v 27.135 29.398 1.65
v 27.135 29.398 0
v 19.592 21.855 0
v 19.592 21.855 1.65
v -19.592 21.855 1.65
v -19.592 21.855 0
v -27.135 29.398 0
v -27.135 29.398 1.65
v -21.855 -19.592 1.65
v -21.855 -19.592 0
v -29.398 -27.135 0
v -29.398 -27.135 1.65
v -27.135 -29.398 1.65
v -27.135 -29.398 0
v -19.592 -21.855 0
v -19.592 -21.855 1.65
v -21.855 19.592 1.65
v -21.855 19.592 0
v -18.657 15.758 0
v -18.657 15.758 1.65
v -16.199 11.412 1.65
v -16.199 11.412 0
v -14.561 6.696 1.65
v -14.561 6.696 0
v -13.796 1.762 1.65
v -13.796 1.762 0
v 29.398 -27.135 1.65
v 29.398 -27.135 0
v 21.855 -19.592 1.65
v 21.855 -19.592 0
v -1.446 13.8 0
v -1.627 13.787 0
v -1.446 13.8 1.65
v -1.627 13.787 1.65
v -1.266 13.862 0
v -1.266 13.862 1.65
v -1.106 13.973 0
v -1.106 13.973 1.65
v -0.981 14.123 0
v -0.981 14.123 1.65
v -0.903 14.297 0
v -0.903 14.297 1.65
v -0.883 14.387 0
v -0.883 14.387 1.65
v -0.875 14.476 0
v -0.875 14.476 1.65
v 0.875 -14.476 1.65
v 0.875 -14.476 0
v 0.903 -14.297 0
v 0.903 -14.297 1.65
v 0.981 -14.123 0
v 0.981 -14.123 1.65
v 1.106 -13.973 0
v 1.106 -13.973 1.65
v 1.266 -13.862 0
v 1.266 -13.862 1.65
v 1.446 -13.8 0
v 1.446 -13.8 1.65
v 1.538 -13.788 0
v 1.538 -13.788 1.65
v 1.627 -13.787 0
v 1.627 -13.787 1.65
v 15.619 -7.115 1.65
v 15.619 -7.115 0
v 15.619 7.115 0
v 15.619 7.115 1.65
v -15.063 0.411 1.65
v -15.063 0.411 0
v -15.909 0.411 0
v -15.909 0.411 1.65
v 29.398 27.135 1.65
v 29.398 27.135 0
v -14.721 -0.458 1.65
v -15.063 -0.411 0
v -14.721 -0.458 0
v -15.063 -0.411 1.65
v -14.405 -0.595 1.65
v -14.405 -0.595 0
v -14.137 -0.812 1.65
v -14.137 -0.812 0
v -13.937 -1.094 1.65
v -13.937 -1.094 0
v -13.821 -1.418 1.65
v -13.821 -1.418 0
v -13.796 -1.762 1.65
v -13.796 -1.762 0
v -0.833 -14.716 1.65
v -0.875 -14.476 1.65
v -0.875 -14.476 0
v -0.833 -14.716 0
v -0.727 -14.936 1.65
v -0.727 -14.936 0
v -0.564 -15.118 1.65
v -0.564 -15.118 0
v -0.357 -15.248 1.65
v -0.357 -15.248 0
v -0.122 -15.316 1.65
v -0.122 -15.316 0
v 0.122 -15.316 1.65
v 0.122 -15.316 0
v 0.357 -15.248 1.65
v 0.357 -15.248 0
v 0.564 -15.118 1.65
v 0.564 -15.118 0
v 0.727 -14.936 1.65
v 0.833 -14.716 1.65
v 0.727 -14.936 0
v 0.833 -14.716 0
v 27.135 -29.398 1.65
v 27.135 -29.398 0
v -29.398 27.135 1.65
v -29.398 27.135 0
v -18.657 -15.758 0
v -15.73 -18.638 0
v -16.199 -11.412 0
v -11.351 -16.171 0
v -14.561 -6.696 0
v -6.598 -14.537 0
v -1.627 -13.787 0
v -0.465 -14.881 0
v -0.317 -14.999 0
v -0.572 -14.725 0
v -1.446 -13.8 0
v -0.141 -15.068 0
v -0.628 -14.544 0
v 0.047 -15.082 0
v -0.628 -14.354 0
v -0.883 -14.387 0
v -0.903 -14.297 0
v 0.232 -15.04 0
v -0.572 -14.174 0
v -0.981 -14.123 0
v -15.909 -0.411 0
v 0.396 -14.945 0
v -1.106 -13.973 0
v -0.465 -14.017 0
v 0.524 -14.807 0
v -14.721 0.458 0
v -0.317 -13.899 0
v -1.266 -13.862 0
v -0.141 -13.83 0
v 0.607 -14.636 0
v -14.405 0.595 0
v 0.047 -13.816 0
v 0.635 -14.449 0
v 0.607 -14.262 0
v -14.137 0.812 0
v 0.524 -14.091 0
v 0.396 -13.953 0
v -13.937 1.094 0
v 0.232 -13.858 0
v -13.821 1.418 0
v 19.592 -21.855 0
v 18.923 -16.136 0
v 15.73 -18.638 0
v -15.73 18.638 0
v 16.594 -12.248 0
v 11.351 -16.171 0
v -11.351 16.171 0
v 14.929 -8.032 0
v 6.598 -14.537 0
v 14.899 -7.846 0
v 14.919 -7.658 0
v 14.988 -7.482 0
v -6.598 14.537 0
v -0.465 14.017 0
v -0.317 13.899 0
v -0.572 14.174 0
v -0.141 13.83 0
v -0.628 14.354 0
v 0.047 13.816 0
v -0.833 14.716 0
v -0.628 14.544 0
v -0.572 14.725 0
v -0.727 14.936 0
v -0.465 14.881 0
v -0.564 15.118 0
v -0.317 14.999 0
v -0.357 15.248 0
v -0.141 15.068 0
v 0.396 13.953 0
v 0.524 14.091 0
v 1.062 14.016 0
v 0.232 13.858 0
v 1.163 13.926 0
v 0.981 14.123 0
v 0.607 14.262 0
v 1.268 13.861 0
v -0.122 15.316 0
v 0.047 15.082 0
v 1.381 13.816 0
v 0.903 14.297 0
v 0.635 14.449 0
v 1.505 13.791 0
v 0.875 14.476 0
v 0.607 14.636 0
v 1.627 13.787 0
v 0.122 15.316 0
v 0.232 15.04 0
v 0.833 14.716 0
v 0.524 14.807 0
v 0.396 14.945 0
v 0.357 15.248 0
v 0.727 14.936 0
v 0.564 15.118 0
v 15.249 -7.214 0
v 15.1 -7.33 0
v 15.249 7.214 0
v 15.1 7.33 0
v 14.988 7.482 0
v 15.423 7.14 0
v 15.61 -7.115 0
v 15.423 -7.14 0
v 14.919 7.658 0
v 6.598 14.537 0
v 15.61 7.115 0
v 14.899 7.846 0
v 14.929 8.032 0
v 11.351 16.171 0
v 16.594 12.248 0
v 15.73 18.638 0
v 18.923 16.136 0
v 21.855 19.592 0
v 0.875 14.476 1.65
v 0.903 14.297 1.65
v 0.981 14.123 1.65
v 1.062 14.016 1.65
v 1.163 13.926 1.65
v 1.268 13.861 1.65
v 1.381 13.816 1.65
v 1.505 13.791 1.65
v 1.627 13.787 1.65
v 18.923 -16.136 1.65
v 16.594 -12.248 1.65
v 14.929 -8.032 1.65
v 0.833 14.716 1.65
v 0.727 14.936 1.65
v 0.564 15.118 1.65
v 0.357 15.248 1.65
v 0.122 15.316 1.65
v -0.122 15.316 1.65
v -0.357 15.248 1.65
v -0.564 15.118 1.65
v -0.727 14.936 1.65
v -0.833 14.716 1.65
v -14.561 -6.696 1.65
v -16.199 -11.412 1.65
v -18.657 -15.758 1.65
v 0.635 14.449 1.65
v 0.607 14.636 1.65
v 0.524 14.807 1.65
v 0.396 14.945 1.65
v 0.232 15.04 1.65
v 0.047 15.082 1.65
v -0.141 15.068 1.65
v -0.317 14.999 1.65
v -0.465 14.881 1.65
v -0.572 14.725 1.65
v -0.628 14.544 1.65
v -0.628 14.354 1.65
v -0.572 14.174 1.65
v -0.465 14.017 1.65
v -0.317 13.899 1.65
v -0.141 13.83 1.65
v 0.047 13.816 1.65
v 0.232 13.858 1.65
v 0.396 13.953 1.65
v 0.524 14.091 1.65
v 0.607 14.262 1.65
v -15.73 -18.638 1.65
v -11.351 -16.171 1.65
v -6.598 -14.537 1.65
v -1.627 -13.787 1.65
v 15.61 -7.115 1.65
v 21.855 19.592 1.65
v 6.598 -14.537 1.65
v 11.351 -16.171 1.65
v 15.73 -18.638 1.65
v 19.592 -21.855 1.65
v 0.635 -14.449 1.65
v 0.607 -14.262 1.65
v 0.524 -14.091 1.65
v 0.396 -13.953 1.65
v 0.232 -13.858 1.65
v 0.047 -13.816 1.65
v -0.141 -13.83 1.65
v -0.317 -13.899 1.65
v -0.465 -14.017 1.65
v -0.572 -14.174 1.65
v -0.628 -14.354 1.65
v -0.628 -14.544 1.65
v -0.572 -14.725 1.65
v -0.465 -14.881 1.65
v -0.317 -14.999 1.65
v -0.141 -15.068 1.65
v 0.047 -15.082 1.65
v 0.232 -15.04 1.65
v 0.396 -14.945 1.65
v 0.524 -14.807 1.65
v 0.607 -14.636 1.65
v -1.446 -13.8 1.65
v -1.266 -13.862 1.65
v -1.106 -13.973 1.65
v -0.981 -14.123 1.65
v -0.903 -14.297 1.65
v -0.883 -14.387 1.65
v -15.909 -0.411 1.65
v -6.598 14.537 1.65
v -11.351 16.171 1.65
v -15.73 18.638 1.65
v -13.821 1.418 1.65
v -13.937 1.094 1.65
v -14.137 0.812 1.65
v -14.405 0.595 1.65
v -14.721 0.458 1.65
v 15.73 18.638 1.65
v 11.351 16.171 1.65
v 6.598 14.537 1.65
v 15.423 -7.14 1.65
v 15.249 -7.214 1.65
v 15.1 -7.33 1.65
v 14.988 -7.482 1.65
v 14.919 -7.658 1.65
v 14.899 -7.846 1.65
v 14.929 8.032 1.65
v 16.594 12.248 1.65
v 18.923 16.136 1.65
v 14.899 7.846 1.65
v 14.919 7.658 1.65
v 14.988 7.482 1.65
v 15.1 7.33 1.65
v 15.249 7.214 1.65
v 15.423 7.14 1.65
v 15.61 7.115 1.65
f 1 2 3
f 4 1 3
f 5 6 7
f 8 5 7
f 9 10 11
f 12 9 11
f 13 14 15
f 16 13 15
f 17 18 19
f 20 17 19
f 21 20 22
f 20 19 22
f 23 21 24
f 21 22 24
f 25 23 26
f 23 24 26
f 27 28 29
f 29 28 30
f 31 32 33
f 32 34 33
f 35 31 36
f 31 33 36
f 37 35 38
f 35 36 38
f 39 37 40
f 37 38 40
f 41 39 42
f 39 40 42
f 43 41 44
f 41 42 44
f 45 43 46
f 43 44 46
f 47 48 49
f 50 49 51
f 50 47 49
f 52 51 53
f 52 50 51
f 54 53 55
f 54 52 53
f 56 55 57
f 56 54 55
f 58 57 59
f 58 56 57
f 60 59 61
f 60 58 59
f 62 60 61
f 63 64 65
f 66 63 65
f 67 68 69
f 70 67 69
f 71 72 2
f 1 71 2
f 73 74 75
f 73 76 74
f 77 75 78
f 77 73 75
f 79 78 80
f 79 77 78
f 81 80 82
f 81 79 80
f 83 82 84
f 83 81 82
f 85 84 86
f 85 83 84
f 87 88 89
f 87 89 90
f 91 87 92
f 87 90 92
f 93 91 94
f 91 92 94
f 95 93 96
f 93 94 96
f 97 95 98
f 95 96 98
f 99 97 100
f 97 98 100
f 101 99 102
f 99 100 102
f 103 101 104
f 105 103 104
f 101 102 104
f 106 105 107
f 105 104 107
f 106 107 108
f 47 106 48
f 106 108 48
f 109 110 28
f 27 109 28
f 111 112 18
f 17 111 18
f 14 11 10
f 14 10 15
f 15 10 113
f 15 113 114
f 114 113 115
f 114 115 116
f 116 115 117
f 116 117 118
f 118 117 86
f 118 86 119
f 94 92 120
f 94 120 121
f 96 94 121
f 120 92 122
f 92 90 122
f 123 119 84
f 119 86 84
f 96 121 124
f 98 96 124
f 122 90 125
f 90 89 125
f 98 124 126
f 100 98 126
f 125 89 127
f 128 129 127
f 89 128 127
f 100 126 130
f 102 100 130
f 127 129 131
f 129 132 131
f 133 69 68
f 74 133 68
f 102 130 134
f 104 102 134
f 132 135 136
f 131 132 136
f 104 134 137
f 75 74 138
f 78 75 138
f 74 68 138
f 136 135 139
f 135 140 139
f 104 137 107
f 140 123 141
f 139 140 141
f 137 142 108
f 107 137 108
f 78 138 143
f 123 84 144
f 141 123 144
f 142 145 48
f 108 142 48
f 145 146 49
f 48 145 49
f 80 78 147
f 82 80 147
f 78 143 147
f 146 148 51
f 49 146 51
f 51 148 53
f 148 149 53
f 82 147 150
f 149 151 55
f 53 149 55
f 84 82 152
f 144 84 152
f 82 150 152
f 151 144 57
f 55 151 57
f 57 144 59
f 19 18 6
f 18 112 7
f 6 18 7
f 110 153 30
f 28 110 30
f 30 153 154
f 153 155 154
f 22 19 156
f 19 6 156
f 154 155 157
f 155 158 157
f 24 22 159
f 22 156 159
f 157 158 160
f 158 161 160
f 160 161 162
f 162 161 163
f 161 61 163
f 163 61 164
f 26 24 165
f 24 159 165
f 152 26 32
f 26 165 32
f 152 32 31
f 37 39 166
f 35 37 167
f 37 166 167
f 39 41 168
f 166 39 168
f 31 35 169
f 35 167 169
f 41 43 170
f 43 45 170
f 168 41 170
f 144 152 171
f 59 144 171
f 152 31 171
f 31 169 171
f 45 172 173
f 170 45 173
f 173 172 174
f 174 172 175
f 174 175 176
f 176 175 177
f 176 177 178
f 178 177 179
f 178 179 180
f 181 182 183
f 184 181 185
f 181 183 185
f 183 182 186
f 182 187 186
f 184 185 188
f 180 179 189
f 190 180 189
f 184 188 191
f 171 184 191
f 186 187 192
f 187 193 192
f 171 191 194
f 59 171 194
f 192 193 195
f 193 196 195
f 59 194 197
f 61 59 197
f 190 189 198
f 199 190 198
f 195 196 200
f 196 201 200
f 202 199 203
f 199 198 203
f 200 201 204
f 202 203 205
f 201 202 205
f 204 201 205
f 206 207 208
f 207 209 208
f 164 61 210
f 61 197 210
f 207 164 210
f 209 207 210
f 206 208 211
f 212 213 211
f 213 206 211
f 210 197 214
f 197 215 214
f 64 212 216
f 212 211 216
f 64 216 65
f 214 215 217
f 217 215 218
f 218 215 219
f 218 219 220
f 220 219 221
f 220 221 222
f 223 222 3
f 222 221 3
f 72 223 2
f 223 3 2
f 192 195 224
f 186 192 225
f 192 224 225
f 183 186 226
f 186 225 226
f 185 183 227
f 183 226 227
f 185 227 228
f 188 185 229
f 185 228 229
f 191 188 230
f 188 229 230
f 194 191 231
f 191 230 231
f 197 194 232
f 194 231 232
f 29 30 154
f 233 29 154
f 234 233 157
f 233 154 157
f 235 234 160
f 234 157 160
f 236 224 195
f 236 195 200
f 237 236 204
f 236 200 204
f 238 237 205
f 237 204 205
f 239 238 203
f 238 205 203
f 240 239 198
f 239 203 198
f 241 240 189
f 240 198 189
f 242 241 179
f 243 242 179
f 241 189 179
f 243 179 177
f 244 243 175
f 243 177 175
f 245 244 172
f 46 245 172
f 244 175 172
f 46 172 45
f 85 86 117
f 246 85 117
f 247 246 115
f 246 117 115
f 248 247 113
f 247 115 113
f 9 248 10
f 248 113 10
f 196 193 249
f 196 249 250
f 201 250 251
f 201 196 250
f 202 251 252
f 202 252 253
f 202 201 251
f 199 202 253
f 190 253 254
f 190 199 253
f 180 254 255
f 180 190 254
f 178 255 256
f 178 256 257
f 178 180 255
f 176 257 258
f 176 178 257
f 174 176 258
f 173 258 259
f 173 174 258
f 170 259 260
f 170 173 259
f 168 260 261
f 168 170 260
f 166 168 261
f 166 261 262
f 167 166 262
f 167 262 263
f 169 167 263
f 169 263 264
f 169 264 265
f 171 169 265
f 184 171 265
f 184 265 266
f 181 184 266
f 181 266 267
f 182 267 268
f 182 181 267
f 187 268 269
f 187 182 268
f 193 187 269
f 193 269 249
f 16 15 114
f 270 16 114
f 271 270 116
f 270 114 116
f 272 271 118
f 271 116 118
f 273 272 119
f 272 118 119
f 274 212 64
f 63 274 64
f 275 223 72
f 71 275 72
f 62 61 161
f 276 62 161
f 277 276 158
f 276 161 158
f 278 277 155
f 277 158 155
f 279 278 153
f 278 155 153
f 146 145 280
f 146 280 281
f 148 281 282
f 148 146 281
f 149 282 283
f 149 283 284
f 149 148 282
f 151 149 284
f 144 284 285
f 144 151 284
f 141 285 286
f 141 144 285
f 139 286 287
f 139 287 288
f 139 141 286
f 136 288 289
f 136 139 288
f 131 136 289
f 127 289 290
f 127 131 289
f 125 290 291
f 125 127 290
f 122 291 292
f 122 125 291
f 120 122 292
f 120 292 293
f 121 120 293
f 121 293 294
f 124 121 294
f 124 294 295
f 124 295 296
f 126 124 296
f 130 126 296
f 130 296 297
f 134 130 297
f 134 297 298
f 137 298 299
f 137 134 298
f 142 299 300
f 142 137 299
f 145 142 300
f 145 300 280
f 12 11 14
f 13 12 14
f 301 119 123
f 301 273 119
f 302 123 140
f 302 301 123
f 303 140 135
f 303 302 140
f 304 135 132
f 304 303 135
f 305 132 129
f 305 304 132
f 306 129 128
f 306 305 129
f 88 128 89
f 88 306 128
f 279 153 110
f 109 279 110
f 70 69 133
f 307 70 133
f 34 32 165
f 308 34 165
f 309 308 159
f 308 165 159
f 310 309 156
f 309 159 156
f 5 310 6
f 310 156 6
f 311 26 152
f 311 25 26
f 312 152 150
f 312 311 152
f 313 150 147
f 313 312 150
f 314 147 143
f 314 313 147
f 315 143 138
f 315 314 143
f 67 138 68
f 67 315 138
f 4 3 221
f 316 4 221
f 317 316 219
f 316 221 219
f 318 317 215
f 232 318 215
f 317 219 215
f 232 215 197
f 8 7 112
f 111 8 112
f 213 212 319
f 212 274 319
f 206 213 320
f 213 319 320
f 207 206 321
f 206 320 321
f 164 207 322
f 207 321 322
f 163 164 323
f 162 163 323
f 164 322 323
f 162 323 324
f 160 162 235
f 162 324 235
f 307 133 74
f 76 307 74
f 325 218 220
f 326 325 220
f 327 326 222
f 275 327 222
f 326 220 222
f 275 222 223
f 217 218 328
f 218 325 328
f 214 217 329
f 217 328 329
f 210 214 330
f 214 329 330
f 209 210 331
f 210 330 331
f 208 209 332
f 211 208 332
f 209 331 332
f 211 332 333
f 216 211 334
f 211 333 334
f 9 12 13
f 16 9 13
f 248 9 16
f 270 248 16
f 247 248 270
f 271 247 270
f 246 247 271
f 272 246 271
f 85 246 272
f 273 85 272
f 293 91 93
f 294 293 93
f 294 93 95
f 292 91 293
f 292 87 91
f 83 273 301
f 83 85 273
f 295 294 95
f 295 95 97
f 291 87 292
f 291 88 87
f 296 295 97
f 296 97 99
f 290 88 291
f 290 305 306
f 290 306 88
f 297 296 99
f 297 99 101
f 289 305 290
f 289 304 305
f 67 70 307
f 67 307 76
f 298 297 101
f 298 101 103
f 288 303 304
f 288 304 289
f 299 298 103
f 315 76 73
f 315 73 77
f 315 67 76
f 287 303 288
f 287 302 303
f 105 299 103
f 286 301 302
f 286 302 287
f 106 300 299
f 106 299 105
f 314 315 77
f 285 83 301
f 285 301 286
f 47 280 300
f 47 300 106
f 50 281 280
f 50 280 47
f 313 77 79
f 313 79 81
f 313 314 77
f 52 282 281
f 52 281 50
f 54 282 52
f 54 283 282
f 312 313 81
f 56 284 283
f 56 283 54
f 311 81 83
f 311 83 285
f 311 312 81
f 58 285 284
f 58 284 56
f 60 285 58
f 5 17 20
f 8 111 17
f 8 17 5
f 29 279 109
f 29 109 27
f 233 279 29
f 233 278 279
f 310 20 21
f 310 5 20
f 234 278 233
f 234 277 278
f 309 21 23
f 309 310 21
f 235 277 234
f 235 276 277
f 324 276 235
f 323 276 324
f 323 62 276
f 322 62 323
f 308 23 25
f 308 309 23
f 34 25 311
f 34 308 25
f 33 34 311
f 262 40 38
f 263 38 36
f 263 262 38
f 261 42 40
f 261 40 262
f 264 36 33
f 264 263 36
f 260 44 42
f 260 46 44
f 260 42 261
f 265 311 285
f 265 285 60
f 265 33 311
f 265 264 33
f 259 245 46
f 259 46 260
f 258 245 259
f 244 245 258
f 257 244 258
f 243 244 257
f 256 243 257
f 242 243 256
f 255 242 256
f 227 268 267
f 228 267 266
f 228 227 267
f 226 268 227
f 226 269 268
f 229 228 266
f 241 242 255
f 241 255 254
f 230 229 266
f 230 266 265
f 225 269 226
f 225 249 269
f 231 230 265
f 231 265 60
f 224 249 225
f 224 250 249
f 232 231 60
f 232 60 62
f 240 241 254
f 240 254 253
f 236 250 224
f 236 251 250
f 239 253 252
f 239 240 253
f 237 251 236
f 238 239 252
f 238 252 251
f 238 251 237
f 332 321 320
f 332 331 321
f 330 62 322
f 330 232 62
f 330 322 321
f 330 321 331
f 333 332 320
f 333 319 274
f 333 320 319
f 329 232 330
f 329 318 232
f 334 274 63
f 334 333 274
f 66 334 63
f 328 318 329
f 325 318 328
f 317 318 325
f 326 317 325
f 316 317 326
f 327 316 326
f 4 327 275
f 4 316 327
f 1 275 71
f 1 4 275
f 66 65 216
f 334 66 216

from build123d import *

# Parameters (mm, degrees)
SKETCH1_R           = 0.634780864
BOSS_EXTRUDE1_DEPTH = 1.65
FILLET1_R           = 0.7112
FILLET2_R           = 0.7112
FILLET3_R           = 1.27


with BuildPart() as part:
    # Sketch1 → Boss-Extrude1 (new body)
    with BuildSketch(Plane.XY):
        with BuildLine():
            Line((-27.135222714, 29.397964527), (-29.397964527, 27.135222714))
            Line((-29.397964527, 27.135222714), (-21.855060774, 19.592318961))
            ThreePointArc((-21.855060774, 19.592318961), (-15.928204538, 10.7930358), (-13.742710724, 0.41138729))
            Line((-13.742710724, 0.41138729), (-15.908512943, 0.41138729))
            Line((-15.908512943, 0.41138729), (-15.908512943, -0.41138729))
            Line((-15.908512943, -0.41138729), (-13.742710724, -0.41138729))
            ThreePointArc((-13.742710724, -0.41138729), (-15.928204538, -10.7930358), (-21.855060774, -19.592318961))
            Line((-21.855060774, -19.592318961), (-29.397964527, -27.135222714))
            Line((-29.397964527, -27.135222714), (-27.135222714, -29.397964527))
            Line((-27.135222714, -29.397964527), (-19.592318961, -21.855060774))
            ThreePointArc((-19.592318961, -21.855060774), (-10.842511416, -15.949186255), (-0.51885361, -13.744514983))
            ThreePointArc((-0.51885361, -13.744514983), (0, -15.324082887), (0.51885361, -13.744514983))
            ThreePointArc((0.51885361, -13.744514983), (10.842511416, -15.949186255), (19.592318961, -21.855060774))
            Line((19.592318961, -21.855060774), (27.135222714, -29.397964527))
            Line((27.135222714, -29.397964527), (29.397964527, -27.135222714))
            Line((29.397964527, -27.135222714), (21.855060774, -19.592318961))
            ThreePointArc((21.855060774, -19.592318961), (17.437236913, -13.828628501), (14.668755804, -7.114999994))
            Line((14.668755804, -7.114999994), (15.618947426, -7.114999994))
            Line((15.618947426, -7.114999994), (15.618947426, 7.114999994))
            Line((15.618947426, 7.114999994), (14.668755804, 7.114999994))
            ThreePointArc((14.668755804, 7.114999994), (17.437236913, 13.828628501), (21.855060774, 19.592318961))
            Line((21.855060774, 19.592318961), (29.397964527, 27.135222714))
            Line((29.397964527, 27.135222714), (27.135222714, 29.397964527))
            Line((27.135222714, 29.397964527), (19.592318961, 21.855060774))
            ThreePointArc((19.592318961, 21.855060774), (10.842511416, 15.949186255), (0.51885361, 13.744514983))
            ThreePointArc((0.51885361, 13.744514983), (0, 15.324082887), (-0.51885361, 13.744514983))
            ThreePointArc((-0.51885361, 13.744514983), (-10.842511416, 15.949186255), (-19.592318961, 21.855060774))
            Line((-19.592318961, 21.855060774), (-27.135222714, 29.397964527))
        make_face()
        with Locations((0, 14.449082887)):
            Circle(SKETCH1_R, mode=Mode.SUBTRACT)
        with Locations((0, -14.449082887)):
            Circle(SKETCH1_R, mode=Mode.SUBTRACT)
    extrude(amount=BOSS_EXTRUDE1_DEPTH)

    # Fillet1
    fillet1_edges = [part.edges().sort_by_distance(p)[0] for p in [
        (0.51885361, 13.744514983, 0.825),
        (0.51885361, -13.744514983, 0.825),
        (-0.51885361, -13.744514983, 0.825),
        (-0.51885361, 13.744514983, 0.825),
    ]]
    fillet(fillet1_edges, radius=FILLET1_R)

    # Fillet2
    fillet2_edges = [part.edges().sort_by_distance(p)[0] for p in [
        (14.668755804, 7.114999994, 0.825),
        (14.668755804, -7.114999994, 0.825),
    ]]
    fillet(fillet2_edges, radius=FILLET2_R)

    # Fillet3
    fillet3_edges = [part.edges().sort_by_distance(p)[0] for p in [
        (-13.742710724, -0.41138729, 0.825),
        (-13.742710724, 0.41138729, 0.825),
    ]]
    fillet(fillet3_edges, radius=FILLET3_R)


solid = part.part
